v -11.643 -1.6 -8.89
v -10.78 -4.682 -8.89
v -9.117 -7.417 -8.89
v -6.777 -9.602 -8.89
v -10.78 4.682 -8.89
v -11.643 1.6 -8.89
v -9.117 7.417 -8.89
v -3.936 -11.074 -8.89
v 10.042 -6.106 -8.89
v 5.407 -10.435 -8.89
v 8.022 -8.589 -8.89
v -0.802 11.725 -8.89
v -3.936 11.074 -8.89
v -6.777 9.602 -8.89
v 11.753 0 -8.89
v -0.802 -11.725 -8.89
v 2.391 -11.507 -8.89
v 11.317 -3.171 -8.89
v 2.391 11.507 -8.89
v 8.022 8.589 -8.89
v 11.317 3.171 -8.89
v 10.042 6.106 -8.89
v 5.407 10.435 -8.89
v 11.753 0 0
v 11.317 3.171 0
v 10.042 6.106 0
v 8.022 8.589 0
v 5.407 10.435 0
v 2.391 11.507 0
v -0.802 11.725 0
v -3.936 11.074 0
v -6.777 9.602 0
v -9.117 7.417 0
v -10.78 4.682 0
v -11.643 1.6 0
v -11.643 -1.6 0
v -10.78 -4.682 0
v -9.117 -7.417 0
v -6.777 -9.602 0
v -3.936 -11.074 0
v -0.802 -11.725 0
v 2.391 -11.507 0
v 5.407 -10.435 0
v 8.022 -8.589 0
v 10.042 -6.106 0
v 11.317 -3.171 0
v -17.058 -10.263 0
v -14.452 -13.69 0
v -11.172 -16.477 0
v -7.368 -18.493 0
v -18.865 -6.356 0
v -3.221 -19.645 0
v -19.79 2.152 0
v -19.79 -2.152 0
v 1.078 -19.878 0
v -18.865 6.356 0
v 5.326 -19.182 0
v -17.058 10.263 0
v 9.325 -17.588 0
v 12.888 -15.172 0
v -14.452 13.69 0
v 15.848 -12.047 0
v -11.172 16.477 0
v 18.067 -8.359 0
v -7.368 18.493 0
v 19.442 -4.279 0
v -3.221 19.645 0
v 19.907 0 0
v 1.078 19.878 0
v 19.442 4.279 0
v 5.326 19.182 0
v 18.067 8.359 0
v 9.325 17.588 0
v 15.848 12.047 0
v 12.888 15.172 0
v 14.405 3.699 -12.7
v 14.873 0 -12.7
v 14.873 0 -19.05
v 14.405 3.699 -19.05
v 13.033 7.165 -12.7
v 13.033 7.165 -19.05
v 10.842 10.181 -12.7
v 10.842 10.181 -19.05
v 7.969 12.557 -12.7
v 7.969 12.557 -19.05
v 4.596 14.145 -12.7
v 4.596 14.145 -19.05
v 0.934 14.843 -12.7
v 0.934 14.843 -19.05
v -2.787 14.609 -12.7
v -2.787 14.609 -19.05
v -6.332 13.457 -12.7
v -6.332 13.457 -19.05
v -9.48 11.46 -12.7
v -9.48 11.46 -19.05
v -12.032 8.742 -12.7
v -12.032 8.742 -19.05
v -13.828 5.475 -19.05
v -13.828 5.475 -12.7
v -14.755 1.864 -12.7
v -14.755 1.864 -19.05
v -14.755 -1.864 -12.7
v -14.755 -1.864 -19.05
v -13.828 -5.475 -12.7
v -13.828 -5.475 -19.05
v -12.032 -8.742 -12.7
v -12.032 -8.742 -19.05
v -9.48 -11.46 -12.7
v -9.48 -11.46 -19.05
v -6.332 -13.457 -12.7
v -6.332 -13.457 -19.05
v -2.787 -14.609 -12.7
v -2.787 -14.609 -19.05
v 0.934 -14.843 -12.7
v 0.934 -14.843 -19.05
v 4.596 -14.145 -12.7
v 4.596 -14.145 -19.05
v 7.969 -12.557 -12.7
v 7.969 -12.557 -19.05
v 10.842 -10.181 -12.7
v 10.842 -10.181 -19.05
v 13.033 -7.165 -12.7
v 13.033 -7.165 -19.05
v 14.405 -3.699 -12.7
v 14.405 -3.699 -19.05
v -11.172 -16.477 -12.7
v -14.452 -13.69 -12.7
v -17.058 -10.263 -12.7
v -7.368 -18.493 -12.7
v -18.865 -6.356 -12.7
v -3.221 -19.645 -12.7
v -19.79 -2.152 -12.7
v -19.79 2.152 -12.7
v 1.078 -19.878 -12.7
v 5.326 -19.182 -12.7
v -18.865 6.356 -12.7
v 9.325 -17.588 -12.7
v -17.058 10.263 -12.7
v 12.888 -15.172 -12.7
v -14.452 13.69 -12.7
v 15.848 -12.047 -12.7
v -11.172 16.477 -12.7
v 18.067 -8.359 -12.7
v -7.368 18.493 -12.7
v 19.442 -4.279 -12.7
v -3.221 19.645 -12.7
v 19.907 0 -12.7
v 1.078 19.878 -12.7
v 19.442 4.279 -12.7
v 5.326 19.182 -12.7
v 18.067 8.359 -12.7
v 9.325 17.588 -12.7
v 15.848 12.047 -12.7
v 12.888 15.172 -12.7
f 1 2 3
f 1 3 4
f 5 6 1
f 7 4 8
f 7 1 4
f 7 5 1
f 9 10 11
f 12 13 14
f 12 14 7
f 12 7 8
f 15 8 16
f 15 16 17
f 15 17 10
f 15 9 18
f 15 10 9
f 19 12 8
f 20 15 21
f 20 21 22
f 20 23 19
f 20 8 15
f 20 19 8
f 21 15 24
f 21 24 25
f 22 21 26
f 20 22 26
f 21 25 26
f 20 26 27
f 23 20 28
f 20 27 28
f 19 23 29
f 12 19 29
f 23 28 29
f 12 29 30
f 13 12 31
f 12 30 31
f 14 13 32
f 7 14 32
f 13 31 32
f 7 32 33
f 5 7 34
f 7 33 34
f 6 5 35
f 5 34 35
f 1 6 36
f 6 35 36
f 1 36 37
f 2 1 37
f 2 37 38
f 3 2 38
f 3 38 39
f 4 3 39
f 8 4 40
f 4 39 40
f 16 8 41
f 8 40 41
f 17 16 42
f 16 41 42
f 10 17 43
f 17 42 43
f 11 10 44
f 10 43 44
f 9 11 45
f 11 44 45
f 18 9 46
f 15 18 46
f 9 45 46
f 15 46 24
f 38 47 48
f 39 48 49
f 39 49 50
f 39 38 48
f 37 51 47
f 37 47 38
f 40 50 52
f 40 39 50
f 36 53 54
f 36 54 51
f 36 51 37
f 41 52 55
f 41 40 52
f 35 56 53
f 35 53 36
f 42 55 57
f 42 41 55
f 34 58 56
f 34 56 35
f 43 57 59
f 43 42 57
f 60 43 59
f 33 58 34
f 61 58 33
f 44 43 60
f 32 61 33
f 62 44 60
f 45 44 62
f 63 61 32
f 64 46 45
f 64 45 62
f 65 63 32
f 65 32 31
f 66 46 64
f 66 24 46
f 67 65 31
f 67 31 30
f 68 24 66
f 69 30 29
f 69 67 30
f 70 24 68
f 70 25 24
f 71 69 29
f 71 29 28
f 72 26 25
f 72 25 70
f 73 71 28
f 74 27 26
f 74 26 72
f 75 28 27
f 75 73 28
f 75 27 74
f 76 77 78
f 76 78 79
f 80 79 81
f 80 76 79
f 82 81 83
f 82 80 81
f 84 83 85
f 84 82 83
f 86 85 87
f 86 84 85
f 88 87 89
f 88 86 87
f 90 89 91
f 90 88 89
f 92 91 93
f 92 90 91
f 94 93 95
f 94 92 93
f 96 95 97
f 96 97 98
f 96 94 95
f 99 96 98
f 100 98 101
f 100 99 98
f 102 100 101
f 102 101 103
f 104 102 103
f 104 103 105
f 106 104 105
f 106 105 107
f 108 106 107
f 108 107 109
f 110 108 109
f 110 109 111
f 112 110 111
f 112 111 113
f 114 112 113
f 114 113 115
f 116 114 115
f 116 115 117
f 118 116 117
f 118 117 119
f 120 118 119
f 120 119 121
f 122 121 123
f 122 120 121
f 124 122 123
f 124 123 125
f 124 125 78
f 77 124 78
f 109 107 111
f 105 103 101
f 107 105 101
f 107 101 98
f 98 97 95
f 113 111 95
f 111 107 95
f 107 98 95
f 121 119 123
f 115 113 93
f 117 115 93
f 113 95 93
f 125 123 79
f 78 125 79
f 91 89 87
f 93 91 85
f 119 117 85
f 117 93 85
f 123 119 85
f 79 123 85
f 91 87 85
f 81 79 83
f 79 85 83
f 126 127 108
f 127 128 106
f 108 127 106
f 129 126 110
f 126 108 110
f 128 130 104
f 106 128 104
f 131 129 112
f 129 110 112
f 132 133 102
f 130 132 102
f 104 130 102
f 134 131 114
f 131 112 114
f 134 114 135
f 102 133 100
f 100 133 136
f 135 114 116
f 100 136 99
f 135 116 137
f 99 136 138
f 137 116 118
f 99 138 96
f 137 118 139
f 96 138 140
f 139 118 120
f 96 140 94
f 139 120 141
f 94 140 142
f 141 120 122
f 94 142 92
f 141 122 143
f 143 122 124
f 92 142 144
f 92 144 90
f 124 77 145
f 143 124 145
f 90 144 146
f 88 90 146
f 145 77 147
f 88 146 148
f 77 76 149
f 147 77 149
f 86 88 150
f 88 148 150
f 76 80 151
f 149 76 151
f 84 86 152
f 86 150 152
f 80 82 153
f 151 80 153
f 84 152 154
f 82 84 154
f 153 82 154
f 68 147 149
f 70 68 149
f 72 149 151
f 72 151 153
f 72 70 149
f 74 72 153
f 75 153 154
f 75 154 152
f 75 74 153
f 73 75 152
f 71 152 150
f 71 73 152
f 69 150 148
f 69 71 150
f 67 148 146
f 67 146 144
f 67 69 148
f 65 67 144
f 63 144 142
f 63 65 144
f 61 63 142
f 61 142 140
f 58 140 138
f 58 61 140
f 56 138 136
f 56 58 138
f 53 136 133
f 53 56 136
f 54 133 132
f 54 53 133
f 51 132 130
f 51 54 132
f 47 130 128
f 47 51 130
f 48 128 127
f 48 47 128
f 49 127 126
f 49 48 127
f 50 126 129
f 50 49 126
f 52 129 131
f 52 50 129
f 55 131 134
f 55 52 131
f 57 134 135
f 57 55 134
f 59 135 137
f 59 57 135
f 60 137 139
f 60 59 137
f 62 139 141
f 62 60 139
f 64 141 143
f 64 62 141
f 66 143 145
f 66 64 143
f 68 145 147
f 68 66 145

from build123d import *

# Parameters (mm, degrees)
F1_R     = 19.907119
F2_DEPTH = 12.7
F3_R     = 14.872727
F4_DEPTH = 19.05
F0_R     = 11.75258
F5_DEPTH = 8.89


with BuildPart() as f2:
    # F1 (on Top) → F2 (new body)
    with BuildSketch(Plane.XY):
        Circle(F1_R)
    extrude(amount=-F2_DEPTH)

    # F3 (on Top) → F4 (join)
    with BuildSketch(Plane.XY):
        Circle(F3_R)
    extrude(amount=-F4_DEPTH)

    # F0 (on Top) → F5 (cut)
    with BuildSketch(Plane.XY):
        Circle(F0_R)
    extrude(amount=-F5_DEPTH, mode=Mode.SUBTRACT)


solid = f2.part
